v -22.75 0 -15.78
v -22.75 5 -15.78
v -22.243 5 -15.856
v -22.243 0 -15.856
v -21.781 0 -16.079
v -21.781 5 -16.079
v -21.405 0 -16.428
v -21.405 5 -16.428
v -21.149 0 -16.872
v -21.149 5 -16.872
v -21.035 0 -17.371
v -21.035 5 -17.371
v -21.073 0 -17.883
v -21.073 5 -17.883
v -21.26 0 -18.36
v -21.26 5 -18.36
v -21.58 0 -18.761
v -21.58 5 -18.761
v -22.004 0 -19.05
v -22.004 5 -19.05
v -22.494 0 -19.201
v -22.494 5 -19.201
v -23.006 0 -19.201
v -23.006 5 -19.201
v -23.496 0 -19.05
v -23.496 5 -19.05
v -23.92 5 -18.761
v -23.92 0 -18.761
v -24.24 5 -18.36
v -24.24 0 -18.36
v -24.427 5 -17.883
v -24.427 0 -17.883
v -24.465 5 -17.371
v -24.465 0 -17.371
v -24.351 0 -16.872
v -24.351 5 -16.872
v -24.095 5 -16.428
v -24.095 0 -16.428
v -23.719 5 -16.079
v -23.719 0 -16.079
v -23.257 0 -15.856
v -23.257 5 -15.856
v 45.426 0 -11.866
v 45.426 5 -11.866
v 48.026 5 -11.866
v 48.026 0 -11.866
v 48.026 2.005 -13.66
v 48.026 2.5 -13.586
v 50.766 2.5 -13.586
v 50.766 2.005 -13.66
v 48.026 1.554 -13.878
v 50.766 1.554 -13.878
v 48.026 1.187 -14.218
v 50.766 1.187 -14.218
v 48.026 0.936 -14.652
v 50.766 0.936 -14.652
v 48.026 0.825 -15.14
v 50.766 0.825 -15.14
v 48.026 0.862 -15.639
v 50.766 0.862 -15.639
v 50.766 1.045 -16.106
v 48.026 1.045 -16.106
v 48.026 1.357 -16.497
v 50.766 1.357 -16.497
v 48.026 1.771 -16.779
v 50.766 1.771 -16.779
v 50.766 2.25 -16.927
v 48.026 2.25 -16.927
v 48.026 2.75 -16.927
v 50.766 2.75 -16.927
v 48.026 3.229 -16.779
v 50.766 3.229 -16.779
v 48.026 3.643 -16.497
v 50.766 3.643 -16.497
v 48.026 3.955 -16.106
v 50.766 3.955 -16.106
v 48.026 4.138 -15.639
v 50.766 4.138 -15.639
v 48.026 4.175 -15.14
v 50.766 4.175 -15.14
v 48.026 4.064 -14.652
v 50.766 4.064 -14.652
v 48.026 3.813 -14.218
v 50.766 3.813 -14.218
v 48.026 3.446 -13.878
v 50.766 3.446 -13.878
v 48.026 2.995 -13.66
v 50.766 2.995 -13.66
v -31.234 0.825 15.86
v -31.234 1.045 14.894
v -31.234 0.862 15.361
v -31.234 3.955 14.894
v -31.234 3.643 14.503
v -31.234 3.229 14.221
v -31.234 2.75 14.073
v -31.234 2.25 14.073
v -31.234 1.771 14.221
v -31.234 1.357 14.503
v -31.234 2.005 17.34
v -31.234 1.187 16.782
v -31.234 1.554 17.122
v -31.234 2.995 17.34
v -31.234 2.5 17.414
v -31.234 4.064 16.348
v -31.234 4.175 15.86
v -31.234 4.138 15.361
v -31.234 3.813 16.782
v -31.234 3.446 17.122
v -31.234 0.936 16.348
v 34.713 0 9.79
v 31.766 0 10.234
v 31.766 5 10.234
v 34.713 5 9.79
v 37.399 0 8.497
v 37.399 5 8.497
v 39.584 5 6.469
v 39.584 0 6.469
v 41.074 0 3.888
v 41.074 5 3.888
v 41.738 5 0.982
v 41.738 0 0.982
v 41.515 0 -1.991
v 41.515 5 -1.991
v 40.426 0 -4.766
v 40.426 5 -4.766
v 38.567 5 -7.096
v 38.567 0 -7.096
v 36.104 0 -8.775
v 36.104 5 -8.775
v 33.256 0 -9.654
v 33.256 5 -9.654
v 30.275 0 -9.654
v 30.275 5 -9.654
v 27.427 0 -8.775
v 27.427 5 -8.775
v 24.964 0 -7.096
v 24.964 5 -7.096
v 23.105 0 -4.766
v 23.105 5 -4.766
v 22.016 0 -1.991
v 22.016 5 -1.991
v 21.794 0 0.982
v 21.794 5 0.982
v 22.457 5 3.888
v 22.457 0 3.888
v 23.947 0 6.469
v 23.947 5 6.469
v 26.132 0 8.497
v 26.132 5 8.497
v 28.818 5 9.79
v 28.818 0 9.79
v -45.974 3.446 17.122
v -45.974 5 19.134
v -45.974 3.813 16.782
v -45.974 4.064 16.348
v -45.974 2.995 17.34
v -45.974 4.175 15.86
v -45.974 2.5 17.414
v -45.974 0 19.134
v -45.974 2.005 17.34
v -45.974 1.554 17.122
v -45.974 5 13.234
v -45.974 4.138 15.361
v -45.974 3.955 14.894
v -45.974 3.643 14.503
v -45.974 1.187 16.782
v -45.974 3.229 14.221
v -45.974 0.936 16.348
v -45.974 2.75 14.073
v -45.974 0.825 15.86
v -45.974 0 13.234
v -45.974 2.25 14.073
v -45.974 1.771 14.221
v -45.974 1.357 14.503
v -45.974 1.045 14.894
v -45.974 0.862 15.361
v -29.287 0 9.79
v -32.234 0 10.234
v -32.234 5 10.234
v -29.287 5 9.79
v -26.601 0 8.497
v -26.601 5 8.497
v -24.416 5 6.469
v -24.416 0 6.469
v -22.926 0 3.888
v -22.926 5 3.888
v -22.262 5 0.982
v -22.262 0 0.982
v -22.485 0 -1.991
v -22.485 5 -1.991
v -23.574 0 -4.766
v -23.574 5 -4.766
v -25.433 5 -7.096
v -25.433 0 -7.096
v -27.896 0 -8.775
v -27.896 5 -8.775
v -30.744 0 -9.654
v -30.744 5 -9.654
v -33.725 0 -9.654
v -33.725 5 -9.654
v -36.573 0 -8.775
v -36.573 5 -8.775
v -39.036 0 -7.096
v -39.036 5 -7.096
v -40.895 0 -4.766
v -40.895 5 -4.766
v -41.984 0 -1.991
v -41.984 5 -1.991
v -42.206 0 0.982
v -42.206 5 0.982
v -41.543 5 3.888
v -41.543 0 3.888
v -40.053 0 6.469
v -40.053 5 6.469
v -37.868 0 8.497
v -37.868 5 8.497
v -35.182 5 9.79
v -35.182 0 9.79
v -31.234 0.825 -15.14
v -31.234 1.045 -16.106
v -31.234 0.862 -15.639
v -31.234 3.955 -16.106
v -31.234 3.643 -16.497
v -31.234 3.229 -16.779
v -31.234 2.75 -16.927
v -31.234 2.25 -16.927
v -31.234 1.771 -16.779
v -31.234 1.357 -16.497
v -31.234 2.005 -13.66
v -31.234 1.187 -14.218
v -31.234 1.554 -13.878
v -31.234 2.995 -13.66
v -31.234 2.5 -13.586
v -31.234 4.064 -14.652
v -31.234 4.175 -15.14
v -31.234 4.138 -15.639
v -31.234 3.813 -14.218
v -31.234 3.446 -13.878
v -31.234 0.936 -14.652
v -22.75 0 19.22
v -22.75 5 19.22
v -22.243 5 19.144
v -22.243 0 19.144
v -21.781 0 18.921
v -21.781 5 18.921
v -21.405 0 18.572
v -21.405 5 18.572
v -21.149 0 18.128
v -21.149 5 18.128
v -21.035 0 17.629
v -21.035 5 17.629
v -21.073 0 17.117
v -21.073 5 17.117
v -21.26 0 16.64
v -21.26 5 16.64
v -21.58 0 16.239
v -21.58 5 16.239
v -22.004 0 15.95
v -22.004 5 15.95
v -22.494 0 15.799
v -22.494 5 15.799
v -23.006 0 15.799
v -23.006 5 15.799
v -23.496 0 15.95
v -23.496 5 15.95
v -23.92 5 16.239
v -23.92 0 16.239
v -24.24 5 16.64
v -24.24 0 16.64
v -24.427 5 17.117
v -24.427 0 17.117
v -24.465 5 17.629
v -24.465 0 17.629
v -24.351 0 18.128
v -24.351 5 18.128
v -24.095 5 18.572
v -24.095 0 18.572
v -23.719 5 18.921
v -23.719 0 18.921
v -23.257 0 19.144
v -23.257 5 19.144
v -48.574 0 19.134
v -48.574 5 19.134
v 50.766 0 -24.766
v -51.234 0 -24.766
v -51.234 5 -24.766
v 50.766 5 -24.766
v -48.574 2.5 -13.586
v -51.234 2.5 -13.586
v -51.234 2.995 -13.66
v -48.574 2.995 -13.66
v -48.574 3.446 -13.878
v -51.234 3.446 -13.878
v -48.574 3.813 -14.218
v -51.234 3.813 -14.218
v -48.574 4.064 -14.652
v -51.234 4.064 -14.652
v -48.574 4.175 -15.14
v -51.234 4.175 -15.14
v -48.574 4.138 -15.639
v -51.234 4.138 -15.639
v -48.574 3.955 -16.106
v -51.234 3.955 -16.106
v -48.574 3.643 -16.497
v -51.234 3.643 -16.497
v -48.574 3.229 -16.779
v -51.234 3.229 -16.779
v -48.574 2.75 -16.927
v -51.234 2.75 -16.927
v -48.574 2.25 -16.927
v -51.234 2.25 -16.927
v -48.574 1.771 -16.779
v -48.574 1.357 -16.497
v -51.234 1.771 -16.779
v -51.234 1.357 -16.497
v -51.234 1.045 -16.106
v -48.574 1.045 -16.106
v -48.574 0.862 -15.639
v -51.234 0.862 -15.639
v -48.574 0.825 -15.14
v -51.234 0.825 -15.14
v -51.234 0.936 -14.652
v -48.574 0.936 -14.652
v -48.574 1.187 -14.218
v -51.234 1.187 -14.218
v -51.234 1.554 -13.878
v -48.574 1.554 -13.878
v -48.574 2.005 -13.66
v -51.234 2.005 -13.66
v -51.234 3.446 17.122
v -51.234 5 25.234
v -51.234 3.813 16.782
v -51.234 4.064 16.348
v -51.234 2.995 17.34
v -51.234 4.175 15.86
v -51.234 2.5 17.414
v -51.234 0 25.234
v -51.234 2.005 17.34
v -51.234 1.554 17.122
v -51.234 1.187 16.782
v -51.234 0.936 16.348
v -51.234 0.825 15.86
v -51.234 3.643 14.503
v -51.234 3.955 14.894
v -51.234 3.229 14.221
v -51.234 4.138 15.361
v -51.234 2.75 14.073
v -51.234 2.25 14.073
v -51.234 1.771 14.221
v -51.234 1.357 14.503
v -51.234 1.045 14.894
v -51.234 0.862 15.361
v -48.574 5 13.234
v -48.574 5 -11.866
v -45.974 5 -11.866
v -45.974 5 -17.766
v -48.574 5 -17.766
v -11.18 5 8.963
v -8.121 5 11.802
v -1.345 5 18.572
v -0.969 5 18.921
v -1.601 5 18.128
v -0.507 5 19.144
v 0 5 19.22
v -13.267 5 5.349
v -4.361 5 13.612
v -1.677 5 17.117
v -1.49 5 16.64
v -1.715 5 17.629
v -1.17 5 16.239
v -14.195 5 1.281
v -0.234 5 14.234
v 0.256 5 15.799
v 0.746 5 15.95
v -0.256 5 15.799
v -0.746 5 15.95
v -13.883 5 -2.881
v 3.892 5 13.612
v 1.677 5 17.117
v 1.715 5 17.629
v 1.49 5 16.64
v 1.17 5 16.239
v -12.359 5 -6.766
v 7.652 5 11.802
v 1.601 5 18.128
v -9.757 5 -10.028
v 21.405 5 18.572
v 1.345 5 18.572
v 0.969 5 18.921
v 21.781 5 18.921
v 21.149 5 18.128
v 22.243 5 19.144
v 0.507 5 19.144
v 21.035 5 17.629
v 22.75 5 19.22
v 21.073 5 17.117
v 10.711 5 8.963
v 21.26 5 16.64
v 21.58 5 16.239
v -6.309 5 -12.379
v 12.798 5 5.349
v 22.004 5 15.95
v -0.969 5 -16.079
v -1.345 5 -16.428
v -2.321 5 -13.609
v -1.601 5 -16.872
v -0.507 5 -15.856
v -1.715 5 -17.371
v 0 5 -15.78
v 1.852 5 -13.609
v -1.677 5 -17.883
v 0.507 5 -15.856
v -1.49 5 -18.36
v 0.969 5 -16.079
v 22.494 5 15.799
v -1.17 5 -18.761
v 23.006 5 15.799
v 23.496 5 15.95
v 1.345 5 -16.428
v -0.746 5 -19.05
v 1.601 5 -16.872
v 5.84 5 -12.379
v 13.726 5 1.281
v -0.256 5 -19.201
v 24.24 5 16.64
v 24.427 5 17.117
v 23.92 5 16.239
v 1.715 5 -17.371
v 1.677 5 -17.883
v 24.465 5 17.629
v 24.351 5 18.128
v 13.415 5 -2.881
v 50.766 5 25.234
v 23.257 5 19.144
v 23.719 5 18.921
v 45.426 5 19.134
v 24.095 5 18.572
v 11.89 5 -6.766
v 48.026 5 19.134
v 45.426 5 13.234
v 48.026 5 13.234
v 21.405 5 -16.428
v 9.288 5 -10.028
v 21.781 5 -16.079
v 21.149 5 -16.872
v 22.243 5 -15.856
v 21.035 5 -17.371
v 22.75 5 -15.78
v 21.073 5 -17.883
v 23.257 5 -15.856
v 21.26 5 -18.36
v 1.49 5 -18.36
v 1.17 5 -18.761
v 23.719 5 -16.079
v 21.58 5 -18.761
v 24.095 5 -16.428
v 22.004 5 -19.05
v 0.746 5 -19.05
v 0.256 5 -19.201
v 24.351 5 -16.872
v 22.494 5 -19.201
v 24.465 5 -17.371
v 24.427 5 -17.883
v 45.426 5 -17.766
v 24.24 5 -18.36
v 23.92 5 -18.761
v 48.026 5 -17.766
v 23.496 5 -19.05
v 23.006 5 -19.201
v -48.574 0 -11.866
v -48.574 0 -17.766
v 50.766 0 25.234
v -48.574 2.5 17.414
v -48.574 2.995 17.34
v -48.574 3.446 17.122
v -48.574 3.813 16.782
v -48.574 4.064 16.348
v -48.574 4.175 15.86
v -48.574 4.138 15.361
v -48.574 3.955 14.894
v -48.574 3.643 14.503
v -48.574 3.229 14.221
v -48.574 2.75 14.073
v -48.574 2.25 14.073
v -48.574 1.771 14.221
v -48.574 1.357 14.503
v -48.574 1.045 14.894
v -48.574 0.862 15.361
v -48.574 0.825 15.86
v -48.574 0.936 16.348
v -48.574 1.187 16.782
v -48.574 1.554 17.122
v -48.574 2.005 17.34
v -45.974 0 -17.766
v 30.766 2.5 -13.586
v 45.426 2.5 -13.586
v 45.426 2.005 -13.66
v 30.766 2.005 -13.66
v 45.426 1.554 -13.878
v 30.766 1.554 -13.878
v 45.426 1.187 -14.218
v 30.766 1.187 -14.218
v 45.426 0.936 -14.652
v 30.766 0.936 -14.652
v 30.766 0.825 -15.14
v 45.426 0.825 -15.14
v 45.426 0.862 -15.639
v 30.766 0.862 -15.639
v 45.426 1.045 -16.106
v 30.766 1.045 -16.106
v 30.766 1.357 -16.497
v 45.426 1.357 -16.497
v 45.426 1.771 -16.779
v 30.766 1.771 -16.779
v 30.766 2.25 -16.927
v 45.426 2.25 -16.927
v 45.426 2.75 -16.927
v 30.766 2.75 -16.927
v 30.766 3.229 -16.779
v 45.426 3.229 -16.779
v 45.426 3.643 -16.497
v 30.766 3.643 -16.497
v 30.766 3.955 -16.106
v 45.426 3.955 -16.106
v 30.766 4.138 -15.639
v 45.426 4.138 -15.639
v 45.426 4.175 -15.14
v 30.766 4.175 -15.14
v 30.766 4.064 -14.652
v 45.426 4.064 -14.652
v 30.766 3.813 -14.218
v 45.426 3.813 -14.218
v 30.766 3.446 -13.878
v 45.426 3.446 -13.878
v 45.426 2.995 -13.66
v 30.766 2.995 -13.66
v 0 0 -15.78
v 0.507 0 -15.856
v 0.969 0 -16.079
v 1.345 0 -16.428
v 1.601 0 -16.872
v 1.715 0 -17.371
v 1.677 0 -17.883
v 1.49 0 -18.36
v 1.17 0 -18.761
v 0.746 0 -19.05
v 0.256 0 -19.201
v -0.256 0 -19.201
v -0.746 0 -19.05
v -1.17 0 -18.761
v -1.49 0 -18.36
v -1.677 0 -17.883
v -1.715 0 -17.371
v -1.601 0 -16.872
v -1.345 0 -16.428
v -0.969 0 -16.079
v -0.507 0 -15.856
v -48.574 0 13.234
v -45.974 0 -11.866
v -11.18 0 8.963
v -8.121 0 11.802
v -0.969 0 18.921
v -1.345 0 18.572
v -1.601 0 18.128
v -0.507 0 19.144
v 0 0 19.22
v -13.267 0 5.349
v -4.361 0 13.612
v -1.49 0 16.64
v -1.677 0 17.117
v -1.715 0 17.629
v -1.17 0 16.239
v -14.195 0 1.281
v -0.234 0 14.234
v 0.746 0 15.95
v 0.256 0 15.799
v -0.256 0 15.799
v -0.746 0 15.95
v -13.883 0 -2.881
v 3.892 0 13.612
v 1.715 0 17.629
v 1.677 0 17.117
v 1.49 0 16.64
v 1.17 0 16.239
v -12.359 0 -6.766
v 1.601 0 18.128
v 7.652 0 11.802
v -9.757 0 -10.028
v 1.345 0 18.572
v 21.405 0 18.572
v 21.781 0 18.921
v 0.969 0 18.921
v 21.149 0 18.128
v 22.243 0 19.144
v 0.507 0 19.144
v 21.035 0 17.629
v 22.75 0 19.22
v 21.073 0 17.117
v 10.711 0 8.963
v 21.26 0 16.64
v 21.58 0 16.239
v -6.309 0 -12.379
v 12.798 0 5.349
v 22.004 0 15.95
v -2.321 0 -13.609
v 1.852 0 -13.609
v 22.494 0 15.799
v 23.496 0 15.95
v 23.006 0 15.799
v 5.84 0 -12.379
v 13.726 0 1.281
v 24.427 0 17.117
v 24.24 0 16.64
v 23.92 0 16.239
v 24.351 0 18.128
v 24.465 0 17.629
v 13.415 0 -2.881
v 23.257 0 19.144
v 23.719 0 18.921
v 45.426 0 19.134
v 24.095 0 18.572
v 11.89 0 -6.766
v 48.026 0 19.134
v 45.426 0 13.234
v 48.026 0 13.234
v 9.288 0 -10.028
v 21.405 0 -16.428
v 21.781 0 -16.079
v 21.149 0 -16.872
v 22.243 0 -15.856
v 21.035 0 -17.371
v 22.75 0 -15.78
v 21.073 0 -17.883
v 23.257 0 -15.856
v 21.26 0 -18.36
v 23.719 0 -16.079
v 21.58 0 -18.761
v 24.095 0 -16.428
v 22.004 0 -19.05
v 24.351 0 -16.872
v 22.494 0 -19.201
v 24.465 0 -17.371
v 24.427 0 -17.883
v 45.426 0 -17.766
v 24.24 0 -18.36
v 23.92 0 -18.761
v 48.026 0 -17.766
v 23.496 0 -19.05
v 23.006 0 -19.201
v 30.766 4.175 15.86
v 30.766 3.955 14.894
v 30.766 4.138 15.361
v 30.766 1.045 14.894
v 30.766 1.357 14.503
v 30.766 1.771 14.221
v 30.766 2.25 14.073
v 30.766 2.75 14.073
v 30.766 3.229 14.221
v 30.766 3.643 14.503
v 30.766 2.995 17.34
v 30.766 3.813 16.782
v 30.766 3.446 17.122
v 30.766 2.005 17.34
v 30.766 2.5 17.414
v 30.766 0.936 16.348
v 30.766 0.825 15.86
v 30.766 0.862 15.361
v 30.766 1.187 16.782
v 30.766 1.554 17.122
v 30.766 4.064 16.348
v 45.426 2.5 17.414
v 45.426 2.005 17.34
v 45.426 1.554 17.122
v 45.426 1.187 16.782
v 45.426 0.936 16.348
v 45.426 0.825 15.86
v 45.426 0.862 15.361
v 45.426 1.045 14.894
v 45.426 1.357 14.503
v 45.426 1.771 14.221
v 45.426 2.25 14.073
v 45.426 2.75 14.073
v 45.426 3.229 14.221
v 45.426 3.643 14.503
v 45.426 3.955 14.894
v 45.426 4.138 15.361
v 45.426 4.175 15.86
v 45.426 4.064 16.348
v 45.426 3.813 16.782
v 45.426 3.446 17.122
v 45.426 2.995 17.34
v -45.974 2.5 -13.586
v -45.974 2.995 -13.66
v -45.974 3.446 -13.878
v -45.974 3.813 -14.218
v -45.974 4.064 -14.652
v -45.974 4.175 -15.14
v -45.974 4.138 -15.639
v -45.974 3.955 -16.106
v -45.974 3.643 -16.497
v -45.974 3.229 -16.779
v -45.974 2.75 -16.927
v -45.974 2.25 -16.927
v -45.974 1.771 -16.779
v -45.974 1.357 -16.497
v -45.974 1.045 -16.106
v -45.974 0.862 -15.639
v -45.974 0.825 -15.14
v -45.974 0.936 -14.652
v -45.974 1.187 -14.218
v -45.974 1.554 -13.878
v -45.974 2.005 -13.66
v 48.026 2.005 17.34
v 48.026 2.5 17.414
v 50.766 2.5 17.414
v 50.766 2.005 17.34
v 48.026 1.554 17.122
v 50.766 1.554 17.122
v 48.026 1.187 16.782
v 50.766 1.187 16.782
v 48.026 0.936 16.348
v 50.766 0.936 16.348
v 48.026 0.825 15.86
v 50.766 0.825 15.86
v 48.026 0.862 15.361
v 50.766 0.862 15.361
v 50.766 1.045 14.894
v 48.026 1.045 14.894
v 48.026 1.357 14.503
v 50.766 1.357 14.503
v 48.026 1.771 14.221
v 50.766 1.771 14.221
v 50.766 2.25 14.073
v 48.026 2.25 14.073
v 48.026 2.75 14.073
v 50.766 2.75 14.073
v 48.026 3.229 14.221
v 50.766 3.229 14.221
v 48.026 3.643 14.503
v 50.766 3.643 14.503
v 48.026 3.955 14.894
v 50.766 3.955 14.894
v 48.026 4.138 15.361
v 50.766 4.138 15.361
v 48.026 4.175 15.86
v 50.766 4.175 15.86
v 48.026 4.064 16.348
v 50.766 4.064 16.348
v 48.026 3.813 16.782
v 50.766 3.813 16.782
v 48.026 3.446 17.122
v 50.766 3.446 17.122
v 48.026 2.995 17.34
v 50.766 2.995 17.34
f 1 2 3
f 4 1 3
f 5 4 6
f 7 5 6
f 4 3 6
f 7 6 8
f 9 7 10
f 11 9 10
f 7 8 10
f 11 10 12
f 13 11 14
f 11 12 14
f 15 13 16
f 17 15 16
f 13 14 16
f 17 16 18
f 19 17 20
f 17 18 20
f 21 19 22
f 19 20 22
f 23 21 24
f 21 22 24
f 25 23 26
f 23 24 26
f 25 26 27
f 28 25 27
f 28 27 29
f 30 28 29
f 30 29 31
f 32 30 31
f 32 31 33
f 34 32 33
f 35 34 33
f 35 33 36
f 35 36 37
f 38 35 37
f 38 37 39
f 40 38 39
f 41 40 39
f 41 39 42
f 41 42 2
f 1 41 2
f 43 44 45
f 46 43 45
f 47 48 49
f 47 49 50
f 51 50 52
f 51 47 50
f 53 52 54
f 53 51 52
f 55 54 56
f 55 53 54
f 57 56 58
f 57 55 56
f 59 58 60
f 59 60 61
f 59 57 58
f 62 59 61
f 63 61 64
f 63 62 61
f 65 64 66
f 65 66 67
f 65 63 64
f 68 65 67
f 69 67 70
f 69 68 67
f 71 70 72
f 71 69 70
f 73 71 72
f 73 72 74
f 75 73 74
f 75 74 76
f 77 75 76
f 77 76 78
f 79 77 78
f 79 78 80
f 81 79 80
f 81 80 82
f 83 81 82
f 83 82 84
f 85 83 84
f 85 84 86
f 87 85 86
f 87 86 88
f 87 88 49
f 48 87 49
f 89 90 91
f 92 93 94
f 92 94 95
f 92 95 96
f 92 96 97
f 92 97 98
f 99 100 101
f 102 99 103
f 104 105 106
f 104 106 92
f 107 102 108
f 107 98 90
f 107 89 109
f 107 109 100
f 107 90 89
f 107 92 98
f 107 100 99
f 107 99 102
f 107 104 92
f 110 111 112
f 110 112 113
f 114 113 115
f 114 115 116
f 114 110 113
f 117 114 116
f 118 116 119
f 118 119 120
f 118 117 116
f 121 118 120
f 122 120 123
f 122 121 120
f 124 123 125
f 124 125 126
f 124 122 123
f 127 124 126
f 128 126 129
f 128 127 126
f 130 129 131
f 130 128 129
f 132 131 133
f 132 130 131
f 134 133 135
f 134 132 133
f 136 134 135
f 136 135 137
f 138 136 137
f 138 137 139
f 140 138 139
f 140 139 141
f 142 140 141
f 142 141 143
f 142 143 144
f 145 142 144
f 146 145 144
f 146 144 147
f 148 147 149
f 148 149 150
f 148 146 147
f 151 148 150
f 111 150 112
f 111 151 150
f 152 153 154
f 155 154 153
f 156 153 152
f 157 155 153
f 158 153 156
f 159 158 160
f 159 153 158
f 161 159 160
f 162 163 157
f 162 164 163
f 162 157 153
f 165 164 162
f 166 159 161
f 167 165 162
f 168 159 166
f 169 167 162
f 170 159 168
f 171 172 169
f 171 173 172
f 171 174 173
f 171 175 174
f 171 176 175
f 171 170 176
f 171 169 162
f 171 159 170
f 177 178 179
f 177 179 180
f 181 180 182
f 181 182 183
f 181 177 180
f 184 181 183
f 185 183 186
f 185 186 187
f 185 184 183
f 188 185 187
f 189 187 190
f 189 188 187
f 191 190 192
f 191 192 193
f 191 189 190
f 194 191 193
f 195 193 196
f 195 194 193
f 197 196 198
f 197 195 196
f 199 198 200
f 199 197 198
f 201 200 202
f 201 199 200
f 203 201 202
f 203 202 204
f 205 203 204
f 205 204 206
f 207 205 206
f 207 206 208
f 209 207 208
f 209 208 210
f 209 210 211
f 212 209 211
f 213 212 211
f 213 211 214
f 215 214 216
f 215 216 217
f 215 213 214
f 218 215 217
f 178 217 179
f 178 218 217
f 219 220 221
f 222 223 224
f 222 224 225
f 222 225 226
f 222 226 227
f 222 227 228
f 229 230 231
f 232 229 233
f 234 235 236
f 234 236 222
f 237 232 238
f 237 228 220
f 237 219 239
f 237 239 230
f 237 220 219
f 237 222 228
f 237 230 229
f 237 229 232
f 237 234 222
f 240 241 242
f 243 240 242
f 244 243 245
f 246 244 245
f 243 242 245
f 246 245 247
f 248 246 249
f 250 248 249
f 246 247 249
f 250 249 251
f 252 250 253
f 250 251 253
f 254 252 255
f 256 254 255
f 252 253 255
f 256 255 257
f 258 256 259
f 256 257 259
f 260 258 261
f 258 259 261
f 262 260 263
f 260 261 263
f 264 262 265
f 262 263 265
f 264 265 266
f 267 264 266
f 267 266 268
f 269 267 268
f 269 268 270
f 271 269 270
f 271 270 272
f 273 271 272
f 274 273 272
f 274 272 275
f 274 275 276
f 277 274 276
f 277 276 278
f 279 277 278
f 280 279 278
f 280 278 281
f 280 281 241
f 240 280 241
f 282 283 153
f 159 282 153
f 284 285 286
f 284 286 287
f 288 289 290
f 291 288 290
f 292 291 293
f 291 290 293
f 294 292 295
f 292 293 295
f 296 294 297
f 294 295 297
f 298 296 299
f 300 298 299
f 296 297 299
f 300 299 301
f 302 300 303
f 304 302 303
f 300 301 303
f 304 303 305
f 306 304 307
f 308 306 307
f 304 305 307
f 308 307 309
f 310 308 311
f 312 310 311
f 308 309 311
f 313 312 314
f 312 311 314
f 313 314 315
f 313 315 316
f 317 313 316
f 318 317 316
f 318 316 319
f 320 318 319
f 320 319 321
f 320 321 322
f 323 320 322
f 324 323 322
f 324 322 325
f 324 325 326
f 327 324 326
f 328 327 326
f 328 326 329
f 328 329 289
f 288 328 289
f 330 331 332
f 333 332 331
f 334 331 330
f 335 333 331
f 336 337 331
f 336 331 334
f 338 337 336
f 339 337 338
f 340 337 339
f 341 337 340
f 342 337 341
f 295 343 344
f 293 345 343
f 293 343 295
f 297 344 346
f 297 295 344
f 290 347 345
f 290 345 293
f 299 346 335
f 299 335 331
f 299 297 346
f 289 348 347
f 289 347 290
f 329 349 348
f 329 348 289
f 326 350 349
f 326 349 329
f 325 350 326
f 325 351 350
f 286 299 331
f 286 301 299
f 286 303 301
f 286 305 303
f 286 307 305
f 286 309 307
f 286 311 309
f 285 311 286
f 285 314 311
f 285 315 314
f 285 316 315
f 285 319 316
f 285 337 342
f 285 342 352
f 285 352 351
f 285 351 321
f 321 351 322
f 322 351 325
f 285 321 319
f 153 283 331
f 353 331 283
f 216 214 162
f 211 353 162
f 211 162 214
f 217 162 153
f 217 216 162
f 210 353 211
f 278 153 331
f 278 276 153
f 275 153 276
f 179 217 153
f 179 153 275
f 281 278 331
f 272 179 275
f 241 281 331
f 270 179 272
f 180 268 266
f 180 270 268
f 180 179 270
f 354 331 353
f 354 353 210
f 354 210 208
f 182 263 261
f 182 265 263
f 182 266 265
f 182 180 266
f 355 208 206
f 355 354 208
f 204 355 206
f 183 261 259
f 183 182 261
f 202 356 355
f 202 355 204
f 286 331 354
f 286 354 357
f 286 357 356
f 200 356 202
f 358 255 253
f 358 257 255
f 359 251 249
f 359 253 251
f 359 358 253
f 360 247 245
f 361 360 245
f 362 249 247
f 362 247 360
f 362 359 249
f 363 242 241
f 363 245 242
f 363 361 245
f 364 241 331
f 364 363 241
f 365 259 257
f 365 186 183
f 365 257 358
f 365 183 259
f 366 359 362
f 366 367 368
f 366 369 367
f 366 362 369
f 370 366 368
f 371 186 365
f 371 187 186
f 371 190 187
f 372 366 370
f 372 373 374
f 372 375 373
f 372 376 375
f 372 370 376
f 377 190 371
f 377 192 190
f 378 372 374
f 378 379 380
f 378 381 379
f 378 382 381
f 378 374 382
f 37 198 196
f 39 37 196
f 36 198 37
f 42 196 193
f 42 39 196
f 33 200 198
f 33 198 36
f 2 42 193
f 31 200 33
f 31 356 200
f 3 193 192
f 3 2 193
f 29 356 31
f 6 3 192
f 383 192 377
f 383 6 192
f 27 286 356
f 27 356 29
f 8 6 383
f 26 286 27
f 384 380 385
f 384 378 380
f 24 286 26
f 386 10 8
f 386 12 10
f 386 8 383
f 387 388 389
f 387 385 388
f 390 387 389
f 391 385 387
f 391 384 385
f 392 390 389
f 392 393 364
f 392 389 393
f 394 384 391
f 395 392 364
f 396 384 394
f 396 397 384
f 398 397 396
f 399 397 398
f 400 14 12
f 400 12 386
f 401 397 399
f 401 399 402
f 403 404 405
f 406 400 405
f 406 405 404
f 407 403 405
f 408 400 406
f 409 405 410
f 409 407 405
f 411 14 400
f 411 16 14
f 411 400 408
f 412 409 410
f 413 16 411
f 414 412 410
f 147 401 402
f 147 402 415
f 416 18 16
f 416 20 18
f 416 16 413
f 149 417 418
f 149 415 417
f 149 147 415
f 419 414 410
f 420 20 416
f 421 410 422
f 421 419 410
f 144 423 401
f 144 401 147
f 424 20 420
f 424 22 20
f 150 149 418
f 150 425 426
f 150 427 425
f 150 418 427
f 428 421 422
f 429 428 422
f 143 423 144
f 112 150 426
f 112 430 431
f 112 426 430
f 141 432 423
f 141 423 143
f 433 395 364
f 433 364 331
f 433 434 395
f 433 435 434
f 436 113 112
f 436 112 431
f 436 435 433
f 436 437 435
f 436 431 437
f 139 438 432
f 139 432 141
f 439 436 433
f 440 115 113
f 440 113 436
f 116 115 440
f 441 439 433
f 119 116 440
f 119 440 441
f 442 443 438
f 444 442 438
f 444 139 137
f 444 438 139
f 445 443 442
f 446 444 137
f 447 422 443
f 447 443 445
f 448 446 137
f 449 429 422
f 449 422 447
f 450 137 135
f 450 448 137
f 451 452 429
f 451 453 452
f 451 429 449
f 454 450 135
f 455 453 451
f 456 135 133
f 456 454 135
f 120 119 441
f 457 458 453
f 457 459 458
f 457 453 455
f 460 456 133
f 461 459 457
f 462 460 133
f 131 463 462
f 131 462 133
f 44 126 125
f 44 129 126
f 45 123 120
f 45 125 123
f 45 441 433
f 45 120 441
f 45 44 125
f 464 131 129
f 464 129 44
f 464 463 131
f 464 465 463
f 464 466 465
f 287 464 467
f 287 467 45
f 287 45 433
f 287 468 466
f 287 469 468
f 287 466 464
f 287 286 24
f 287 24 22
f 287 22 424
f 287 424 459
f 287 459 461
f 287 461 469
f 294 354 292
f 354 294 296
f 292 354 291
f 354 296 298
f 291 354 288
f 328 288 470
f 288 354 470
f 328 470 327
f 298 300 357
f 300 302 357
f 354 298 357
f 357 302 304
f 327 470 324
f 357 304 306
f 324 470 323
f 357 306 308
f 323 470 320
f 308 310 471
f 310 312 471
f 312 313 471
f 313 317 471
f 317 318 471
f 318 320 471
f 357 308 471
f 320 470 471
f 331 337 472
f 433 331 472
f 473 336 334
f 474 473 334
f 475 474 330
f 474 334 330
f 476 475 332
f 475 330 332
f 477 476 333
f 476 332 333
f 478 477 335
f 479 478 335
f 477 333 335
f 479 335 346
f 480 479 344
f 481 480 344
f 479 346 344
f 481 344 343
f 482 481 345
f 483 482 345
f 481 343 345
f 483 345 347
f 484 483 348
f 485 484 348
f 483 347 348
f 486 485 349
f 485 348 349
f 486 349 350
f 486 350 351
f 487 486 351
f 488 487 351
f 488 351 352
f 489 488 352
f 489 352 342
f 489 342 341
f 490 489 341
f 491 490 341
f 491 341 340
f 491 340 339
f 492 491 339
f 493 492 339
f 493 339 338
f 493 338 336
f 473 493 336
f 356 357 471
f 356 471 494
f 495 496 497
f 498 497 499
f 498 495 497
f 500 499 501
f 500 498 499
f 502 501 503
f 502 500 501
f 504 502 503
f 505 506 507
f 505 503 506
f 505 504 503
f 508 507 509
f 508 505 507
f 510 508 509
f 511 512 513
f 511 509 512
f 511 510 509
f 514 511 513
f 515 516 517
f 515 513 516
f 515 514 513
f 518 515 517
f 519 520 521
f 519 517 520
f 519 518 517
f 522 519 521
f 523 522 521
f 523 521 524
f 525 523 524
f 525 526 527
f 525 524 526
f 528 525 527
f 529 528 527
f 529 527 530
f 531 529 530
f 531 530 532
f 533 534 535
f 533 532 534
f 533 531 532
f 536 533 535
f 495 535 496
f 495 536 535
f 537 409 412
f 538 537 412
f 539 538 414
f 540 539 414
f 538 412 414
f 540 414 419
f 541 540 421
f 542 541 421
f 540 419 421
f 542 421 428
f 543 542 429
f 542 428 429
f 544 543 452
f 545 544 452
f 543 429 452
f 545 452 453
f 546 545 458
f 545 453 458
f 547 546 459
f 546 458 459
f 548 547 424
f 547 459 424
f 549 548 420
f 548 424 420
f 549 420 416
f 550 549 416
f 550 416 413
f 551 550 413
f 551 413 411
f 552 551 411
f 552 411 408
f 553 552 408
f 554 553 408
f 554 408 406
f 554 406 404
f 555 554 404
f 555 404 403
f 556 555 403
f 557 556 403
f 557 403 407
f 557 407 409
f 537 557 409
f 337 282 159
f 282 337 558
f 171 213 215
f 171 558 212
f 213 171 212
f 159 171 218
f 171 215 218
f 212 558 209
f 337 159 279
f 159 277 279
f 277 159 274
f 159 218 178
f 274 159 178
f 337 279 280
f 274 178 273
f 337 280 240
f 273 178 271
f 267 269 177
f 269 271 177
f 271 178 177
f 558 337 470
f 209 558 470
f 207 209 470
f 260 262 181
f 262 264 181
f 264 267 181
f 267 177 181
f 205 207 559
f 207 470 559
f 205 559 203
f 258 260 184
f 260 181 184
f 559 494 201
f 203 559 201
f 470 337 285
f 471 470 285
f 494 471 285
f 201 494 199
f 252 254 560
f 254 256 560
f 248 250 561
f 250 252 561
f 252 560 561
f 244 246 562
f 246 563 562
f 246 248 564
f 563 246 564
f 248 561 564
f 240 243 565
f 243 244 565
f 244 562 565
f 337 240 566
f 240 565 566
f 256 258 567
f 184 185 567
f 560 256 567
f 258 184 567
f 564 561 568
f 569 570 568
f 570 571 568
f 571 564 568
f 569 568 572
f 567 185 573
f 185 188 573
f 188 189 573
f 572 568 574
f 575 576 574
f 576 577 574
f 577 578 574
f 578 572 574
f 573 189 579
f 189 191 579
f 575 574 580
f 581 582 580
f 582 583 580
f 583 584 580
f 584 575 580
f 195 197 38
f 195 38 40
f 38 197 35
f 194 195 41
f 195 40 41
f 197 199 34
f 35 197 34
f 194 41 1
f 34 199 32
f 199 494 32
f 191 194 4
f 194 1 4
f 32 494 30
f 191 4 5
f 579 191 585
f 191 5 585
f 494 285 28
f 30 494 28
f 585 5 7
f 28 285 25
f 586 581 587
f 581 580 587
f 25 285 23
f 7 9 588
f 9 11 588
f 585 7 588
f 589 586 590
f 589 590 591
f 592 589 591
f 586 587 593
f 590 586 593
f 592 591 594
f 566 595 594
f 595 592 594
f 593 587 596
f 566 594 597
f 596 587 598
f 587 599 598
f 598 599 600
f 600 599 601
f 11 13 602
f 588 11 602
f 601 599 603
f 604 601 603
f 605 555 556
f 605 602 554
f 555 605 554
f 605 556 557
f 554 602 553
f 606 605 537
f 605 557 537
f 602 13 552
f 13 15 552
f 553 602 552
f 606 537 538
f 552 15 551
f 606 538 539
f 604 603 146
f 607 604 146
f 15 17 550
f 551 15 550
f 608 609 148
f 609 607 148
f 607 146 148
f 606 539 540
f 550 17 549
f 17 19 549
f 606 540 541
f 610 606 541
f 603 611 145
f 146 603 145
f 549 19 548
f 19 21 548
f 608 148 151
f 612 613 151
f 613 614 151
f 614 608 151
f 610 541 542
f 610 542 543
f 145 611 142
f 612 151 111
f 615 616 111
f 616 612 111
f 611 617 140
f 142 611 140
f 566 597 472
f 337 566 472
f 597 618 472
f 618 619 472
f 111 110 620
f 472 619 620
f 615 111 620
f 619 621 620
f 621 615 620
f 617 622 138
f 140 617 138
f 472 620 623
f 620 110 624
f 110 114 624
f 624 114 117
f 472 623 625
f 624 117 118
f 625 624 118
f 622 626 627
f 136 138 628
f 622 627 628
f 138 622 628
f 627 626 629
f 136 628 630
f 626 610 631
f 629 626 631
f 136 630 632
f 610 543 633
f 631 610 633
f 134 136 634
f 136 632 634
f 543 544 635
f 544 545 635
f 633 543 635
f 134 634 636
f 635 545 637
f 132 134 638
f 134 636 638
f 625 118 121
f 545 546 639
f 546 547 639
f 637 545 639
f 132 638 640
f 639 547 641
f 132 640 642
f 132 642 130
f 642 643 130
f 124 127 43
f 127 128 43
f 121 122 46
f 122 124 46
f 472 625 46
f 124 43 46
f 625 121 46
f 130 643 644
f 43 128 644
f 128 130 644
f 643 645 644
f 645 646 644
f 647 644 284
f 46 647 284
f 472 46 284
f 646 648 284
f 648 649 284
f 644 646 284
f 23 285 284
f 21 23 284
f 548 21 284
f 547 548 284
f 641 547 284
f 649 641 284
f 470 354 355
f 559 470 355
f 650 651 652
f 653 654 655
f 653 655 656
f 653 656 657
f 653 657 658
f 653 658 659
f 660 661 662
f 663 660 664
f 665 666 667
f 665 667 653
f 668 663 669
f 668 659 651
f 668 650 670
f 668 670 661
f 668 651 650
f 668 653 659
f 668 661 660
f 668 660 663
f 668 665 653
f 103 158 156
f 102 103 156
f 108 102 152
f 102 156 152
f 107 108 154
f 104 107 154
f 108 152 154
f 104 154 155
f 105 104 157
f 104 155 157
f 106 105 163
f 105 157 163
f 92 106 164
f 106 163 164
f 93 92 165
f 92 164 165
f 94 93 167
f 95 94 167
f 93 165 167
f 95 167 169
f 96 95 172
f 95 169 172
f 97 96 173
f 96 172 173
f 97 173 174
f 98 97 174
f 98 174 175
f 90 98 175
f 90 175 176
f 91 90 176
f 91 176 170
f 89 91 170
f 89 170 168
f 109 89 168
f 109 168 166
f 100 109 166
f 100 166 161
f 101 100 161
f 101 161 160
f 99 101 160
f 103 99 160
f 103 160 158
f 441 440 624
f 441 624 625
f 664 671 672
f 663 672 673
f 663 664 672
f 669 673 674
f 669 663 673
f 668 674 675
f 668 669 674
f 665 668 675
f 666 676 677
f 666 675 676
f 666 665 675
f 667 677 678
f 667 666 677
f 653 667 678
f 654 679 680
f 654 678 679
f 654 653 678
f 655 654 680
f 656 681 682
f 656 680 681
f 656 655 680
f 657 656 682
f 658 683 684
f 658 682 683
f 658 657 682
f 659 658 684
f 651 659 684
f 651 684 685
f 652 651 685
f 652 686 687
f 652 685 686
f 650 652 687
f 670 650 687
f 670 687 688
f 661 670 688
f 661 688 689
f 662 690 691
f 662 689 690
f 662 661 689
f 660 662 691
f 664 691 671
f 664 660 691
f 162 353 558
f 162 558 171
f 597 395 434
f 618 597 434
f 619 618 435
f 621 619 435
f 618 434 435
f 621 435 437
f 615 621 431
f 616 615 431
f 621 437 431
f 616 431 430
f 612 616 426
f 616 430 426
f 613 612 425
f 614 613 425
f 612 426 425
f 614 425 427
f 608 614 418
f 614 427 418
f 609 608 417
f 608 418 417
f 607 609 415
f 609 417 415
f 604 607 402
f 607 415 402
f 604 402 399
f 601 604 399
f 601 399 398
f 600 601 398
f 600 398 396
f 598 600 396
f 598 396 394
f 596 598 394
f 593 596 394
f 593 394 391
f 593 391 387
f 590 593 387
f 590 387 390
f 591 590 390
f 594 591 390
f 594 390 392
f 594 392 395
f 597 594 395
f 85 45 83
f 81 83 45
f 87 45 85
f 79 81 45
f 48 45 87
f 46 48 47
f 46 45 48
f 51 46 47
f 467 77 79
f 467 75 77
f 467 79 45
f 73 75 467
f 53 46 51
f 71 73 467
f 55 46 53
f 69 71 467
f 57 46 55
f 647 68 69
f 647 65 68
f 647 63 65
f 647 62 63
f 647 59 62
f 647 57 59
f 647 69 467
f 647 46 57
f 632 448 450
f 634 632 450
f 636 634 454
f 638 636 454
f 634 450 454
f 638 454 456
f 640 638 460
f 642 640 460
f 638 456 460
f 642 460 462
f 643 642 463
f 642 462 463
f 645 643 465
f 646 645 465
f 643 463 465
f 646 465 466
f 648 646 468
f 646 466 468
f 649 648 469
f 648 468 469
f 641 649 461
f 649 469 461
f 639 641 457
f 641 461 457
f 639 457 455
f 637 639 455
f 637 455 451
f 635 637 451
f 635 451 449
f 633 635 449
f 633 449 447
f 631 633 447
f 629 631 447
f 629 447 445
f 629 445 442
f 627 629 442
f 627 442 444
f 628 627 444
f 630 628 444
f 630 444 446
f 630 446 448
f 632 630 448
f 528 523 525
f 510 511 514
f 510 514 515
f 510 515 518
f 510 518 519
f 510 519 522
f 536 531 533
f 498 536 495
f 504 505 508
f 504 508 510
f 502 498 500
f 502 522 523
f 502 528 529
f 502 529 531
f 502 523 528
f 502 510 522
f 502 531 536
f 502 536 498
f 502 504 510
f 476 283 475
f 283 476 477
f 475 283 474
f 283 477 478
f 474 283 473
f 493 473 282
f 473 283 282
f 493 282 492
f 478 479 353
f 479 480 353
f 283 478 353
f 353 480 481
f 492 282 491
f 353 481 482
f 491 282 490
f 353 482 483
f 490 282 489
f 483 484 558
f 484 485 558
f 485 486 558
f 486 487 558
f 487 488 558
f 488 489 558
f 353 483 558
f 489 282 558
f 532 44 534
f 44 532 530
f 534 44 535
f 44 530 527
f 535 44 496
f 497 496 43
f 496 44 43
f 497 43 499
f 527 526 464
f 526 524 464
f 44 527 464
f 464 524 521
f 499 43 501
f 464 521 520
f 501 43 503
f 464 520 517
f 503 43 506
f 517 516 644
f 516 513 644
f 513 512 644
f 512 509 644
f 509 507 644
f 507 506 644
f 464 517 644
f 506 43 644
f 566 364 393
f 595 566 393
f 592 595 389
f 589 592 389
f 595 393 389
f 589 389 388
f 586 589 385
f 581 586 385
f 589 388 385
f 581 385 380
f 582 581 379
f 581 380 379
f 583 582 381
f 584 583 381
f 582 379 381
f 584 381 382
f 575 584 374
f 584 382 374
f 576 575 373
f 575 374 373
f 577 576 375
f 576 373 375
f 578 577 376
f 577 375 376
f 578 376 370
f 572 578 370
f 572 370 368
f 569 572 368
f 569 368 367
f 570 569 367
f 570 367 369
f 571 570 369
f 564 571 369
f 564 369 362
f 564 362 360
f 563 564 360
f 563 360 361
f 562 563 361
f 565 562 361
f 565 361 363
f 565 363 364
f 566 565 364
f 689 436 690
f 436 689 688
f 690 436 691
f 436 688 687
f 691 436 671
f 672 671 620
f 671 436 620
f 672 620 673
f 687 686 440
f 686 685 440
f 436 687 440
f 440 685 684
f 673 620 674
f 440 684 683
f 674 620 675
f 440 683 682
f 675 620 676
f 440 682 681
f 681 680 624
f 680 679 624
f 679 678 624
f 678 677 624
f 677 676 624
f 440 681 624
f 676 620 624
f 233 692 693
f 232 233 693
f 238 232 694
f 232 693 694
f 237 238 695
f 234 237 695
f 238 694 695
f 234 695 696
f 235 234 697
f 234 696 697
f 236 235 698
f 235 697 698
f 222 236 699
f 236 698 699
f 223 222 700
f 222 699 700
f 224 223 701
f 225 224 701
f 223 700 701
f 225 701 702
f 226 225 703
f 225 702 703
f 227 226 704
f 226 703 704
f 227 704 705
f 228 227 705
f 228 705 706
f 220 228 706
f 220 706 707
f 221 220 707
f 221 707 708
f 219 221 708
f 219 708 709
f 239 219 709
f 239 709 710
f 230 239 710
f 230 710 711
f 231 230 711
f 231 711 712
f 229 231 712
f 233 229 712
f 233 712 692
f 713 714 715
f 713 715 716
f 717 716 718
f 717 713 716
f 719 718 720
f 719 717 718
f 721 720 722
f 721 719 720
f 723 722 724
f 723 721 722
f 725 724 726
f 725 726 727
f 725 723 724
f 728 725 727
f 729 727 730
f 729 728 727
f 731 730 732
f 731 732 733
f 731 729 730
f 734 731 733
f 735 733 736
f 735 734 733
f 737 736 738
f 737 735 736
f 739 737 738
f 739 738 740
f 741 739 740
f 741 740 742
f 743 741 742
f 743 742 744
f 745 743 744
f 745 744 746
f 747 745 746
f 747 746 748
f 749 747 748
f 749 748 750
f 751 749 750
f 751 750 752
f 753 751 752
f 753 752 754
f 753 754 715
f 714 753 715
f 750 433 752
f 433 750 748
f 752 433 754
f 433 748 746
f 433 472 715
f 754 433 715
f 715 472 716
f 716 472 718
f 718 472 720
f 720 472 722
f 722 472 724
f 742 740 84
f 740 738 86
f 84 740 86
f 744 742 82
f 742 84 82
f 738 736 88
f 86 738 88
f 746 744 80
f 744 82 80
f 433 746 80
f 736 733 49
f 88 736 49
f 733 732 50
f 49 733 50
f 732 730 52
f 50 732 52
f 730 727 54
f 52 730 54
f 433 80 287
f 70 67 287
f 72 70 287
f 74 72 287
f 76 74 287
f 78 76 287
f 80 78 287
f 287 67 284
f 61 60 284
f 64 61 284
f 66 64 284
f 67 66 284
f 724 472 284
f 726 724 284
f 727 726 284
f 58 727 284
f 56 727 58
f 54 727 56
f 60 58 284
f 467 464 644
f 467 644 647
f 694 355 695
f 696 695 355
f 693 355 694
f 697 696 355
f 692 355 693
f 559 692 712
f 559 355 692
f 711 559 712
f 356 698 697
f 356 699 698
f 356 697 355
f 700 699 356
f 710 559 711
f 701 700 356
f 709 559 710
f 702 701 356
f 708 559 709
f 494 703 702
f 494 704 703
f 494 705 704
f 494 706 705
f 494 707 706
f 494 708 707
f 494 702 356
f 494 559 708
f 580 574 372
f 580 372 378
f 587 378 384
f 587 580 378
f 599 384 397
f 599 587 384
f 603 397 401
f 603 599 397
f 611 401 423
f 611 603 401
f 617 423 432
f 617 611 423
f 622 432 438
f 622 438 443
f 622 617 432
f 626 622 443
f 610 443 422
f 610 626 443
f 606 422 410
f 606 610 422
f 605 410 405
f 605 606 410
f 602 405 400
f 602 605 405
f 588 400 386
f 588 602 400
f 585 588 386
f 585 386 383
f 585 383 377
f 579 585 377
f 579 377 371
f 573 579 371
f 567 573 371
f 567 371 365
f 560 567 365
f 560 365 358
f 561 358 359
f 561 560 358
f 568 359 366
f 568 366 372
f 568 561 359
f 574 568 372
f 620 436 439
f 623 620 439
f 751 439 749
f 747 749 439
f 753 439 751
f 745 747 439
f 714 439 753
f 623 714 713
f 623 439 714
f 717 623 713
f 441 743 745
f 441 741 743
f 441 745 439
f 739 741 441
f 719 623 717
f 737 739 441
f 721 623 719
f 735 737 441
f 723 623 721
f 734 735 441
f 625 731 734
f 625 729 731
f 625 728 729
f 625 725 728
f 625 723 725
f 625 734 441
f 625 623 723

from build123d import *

# Parameters (mm, degrees)
AGUJEROS_W          = 101.999998093
AGUJEROS_H          = 49.999999814
AGUJEROS_R          = 10.000041491
AGUJEROS_R_2        = 14.000010245
AGUJEROS_R_3        = 10.000041173
AGUJEROS_W_2        = 2.599999308
AGUJEROS_H_2        = 5.899999291
AGUJEROS_W_3        = 2.599999309
BOSS_EXTRUDE1_DEPTH = 5
BASE_R              = 1.72
CUT_EXTRUDE1_DEPTH  = 58.330053722
SKETCH4_R           = 1.68
CUT_EXTRUDE2_DEPTH  = 20
CUT_EXTRUDE3_START  = -20
AGUJEROSLATERALES_R = 1.68
CUT_EXTRUDE3_DEPTH  = 20


with BuildPart() as part:
    # Agujeros → Boss-Extrude1 (new body)
    with BuildSketch(Plane(origin=(0, 0, 0), x_dir=(1, 0, 0), z_dir=(0, 1, 0))):
        with Locations((-0.234376955, -0.234376955)):
            Rectangle(AGUJEROS_W, AGUJEROS_H)
        with Locations(Location((31.765623825, -0.234375367, 0), (0, 0, 270))):
            Circle(AGUJEROS_R, mode=Mode.SUBTRACT)
        with Locations(Location((-0.234386768, -0.23435079, 0), (0, 0, 270))):
            Circle(AGUJEROS_R_2, mode=Mode.SUBTRACT)
        with Locations(Location((-32.23437504, -0.234378061, 0), (0, 0, 270))):
            Circle(AGUJEROS_R_3, mode=Mode.SUBTRACT)
        with Locations((46.725622994, -16.184378266)):
            Rectangle(AGUJEROS_W_2, AGUJEROS_H_2, mode=Mode.SUBTRACT)
        with Locations((46.725622994, 14.815623091)):
            Rectangle(AGUJEROS_W_2, AGUJEROS_H_2, mode=Mode.SUBTRACT)
        with Locations((-47.274377513, -16.184378266)):
            Rectangle(AGUJEROS_W_3, AGUJEROS_H_2, mode=Mode.SUBTRACT)
        with Locations((-47.274377513, 14.815623091)):
            Rectangle(AGUJEROS_W_3, AGUJEROS_H_2, mode=Mode.SUBTRACT)
    extrude(amount=BOSS_EXTRUDE1_DEPTH)

    # Base → Cut-Extrude1 (cut, through all)
    with BuildSketch(Plane(origin=(0, 5, 0), x_dir=(1, 0, 0), z_dir=(0, 1, 0))):
        with Locations(Location((0, 17.5, 0), (0, 0, 270))):
            Circle(BASE_R)
        with Locations(Location((-22.75, 17.5, 0), (0, 0, 270))):
            Circle(BASE_R)
        with Locations(Location((22.75, 17.5, 0), (0, 0, 270))):
            Circle(BASE_R)
        with Locations(Location((0, -17.5, 0), (0, 0, 270))):
            Circle(BASE_R)
        with Locations(Location((22.75, -17.5, 0), (0, 0, 270))):
            Circle(BASE_R)
        with Locations(Location((-22.75, -17.5, 0), (0, 0, 270))):
            Circle(BASE_R)
    extrude(amount=-CUT_EXTRUDE1_DEPTH, mode=Mode.SUBTRACT)

    # Sketch4 → Cut-Extrude2 (cut)
    with BuildSketch(Plane.ZY.offset(51.234376001)):
        with Locations((-15.265622952, 2.5)):
            Circle(SKETCH4_R)
        with Locations((15.734376862, 2.5)):
            Circle(SKETCH4_R)
    extrude(amount=-CUT_EXTRUDE2_DEPTH, mode=Mode.SUBTRACT)

    # AgujerosLaterales → Cut-Extrude3 (cut)
    with BuildSketch(Plane(origin=(50.765622092, 0, 0), x_dir=(0, 0, -1), z_dir=(1, 0, 0)).offset(CUT_EXTRUDE3_START)):
        with Locations(Location((-15.734376862, 2.5, 0), (0, 0, 180))):
            Circle(AGUJEROSLATERALES_R)
        with Locations(Location((15.265622952, 2.5, 0), (0, 0, 180))):
            Circle(AGUJEROSLATERALES_R)
    extrude(amount=CUT_EXTRUDE3_DEPTH, mode=Mode.SUBTRACT)


solid = part.part
